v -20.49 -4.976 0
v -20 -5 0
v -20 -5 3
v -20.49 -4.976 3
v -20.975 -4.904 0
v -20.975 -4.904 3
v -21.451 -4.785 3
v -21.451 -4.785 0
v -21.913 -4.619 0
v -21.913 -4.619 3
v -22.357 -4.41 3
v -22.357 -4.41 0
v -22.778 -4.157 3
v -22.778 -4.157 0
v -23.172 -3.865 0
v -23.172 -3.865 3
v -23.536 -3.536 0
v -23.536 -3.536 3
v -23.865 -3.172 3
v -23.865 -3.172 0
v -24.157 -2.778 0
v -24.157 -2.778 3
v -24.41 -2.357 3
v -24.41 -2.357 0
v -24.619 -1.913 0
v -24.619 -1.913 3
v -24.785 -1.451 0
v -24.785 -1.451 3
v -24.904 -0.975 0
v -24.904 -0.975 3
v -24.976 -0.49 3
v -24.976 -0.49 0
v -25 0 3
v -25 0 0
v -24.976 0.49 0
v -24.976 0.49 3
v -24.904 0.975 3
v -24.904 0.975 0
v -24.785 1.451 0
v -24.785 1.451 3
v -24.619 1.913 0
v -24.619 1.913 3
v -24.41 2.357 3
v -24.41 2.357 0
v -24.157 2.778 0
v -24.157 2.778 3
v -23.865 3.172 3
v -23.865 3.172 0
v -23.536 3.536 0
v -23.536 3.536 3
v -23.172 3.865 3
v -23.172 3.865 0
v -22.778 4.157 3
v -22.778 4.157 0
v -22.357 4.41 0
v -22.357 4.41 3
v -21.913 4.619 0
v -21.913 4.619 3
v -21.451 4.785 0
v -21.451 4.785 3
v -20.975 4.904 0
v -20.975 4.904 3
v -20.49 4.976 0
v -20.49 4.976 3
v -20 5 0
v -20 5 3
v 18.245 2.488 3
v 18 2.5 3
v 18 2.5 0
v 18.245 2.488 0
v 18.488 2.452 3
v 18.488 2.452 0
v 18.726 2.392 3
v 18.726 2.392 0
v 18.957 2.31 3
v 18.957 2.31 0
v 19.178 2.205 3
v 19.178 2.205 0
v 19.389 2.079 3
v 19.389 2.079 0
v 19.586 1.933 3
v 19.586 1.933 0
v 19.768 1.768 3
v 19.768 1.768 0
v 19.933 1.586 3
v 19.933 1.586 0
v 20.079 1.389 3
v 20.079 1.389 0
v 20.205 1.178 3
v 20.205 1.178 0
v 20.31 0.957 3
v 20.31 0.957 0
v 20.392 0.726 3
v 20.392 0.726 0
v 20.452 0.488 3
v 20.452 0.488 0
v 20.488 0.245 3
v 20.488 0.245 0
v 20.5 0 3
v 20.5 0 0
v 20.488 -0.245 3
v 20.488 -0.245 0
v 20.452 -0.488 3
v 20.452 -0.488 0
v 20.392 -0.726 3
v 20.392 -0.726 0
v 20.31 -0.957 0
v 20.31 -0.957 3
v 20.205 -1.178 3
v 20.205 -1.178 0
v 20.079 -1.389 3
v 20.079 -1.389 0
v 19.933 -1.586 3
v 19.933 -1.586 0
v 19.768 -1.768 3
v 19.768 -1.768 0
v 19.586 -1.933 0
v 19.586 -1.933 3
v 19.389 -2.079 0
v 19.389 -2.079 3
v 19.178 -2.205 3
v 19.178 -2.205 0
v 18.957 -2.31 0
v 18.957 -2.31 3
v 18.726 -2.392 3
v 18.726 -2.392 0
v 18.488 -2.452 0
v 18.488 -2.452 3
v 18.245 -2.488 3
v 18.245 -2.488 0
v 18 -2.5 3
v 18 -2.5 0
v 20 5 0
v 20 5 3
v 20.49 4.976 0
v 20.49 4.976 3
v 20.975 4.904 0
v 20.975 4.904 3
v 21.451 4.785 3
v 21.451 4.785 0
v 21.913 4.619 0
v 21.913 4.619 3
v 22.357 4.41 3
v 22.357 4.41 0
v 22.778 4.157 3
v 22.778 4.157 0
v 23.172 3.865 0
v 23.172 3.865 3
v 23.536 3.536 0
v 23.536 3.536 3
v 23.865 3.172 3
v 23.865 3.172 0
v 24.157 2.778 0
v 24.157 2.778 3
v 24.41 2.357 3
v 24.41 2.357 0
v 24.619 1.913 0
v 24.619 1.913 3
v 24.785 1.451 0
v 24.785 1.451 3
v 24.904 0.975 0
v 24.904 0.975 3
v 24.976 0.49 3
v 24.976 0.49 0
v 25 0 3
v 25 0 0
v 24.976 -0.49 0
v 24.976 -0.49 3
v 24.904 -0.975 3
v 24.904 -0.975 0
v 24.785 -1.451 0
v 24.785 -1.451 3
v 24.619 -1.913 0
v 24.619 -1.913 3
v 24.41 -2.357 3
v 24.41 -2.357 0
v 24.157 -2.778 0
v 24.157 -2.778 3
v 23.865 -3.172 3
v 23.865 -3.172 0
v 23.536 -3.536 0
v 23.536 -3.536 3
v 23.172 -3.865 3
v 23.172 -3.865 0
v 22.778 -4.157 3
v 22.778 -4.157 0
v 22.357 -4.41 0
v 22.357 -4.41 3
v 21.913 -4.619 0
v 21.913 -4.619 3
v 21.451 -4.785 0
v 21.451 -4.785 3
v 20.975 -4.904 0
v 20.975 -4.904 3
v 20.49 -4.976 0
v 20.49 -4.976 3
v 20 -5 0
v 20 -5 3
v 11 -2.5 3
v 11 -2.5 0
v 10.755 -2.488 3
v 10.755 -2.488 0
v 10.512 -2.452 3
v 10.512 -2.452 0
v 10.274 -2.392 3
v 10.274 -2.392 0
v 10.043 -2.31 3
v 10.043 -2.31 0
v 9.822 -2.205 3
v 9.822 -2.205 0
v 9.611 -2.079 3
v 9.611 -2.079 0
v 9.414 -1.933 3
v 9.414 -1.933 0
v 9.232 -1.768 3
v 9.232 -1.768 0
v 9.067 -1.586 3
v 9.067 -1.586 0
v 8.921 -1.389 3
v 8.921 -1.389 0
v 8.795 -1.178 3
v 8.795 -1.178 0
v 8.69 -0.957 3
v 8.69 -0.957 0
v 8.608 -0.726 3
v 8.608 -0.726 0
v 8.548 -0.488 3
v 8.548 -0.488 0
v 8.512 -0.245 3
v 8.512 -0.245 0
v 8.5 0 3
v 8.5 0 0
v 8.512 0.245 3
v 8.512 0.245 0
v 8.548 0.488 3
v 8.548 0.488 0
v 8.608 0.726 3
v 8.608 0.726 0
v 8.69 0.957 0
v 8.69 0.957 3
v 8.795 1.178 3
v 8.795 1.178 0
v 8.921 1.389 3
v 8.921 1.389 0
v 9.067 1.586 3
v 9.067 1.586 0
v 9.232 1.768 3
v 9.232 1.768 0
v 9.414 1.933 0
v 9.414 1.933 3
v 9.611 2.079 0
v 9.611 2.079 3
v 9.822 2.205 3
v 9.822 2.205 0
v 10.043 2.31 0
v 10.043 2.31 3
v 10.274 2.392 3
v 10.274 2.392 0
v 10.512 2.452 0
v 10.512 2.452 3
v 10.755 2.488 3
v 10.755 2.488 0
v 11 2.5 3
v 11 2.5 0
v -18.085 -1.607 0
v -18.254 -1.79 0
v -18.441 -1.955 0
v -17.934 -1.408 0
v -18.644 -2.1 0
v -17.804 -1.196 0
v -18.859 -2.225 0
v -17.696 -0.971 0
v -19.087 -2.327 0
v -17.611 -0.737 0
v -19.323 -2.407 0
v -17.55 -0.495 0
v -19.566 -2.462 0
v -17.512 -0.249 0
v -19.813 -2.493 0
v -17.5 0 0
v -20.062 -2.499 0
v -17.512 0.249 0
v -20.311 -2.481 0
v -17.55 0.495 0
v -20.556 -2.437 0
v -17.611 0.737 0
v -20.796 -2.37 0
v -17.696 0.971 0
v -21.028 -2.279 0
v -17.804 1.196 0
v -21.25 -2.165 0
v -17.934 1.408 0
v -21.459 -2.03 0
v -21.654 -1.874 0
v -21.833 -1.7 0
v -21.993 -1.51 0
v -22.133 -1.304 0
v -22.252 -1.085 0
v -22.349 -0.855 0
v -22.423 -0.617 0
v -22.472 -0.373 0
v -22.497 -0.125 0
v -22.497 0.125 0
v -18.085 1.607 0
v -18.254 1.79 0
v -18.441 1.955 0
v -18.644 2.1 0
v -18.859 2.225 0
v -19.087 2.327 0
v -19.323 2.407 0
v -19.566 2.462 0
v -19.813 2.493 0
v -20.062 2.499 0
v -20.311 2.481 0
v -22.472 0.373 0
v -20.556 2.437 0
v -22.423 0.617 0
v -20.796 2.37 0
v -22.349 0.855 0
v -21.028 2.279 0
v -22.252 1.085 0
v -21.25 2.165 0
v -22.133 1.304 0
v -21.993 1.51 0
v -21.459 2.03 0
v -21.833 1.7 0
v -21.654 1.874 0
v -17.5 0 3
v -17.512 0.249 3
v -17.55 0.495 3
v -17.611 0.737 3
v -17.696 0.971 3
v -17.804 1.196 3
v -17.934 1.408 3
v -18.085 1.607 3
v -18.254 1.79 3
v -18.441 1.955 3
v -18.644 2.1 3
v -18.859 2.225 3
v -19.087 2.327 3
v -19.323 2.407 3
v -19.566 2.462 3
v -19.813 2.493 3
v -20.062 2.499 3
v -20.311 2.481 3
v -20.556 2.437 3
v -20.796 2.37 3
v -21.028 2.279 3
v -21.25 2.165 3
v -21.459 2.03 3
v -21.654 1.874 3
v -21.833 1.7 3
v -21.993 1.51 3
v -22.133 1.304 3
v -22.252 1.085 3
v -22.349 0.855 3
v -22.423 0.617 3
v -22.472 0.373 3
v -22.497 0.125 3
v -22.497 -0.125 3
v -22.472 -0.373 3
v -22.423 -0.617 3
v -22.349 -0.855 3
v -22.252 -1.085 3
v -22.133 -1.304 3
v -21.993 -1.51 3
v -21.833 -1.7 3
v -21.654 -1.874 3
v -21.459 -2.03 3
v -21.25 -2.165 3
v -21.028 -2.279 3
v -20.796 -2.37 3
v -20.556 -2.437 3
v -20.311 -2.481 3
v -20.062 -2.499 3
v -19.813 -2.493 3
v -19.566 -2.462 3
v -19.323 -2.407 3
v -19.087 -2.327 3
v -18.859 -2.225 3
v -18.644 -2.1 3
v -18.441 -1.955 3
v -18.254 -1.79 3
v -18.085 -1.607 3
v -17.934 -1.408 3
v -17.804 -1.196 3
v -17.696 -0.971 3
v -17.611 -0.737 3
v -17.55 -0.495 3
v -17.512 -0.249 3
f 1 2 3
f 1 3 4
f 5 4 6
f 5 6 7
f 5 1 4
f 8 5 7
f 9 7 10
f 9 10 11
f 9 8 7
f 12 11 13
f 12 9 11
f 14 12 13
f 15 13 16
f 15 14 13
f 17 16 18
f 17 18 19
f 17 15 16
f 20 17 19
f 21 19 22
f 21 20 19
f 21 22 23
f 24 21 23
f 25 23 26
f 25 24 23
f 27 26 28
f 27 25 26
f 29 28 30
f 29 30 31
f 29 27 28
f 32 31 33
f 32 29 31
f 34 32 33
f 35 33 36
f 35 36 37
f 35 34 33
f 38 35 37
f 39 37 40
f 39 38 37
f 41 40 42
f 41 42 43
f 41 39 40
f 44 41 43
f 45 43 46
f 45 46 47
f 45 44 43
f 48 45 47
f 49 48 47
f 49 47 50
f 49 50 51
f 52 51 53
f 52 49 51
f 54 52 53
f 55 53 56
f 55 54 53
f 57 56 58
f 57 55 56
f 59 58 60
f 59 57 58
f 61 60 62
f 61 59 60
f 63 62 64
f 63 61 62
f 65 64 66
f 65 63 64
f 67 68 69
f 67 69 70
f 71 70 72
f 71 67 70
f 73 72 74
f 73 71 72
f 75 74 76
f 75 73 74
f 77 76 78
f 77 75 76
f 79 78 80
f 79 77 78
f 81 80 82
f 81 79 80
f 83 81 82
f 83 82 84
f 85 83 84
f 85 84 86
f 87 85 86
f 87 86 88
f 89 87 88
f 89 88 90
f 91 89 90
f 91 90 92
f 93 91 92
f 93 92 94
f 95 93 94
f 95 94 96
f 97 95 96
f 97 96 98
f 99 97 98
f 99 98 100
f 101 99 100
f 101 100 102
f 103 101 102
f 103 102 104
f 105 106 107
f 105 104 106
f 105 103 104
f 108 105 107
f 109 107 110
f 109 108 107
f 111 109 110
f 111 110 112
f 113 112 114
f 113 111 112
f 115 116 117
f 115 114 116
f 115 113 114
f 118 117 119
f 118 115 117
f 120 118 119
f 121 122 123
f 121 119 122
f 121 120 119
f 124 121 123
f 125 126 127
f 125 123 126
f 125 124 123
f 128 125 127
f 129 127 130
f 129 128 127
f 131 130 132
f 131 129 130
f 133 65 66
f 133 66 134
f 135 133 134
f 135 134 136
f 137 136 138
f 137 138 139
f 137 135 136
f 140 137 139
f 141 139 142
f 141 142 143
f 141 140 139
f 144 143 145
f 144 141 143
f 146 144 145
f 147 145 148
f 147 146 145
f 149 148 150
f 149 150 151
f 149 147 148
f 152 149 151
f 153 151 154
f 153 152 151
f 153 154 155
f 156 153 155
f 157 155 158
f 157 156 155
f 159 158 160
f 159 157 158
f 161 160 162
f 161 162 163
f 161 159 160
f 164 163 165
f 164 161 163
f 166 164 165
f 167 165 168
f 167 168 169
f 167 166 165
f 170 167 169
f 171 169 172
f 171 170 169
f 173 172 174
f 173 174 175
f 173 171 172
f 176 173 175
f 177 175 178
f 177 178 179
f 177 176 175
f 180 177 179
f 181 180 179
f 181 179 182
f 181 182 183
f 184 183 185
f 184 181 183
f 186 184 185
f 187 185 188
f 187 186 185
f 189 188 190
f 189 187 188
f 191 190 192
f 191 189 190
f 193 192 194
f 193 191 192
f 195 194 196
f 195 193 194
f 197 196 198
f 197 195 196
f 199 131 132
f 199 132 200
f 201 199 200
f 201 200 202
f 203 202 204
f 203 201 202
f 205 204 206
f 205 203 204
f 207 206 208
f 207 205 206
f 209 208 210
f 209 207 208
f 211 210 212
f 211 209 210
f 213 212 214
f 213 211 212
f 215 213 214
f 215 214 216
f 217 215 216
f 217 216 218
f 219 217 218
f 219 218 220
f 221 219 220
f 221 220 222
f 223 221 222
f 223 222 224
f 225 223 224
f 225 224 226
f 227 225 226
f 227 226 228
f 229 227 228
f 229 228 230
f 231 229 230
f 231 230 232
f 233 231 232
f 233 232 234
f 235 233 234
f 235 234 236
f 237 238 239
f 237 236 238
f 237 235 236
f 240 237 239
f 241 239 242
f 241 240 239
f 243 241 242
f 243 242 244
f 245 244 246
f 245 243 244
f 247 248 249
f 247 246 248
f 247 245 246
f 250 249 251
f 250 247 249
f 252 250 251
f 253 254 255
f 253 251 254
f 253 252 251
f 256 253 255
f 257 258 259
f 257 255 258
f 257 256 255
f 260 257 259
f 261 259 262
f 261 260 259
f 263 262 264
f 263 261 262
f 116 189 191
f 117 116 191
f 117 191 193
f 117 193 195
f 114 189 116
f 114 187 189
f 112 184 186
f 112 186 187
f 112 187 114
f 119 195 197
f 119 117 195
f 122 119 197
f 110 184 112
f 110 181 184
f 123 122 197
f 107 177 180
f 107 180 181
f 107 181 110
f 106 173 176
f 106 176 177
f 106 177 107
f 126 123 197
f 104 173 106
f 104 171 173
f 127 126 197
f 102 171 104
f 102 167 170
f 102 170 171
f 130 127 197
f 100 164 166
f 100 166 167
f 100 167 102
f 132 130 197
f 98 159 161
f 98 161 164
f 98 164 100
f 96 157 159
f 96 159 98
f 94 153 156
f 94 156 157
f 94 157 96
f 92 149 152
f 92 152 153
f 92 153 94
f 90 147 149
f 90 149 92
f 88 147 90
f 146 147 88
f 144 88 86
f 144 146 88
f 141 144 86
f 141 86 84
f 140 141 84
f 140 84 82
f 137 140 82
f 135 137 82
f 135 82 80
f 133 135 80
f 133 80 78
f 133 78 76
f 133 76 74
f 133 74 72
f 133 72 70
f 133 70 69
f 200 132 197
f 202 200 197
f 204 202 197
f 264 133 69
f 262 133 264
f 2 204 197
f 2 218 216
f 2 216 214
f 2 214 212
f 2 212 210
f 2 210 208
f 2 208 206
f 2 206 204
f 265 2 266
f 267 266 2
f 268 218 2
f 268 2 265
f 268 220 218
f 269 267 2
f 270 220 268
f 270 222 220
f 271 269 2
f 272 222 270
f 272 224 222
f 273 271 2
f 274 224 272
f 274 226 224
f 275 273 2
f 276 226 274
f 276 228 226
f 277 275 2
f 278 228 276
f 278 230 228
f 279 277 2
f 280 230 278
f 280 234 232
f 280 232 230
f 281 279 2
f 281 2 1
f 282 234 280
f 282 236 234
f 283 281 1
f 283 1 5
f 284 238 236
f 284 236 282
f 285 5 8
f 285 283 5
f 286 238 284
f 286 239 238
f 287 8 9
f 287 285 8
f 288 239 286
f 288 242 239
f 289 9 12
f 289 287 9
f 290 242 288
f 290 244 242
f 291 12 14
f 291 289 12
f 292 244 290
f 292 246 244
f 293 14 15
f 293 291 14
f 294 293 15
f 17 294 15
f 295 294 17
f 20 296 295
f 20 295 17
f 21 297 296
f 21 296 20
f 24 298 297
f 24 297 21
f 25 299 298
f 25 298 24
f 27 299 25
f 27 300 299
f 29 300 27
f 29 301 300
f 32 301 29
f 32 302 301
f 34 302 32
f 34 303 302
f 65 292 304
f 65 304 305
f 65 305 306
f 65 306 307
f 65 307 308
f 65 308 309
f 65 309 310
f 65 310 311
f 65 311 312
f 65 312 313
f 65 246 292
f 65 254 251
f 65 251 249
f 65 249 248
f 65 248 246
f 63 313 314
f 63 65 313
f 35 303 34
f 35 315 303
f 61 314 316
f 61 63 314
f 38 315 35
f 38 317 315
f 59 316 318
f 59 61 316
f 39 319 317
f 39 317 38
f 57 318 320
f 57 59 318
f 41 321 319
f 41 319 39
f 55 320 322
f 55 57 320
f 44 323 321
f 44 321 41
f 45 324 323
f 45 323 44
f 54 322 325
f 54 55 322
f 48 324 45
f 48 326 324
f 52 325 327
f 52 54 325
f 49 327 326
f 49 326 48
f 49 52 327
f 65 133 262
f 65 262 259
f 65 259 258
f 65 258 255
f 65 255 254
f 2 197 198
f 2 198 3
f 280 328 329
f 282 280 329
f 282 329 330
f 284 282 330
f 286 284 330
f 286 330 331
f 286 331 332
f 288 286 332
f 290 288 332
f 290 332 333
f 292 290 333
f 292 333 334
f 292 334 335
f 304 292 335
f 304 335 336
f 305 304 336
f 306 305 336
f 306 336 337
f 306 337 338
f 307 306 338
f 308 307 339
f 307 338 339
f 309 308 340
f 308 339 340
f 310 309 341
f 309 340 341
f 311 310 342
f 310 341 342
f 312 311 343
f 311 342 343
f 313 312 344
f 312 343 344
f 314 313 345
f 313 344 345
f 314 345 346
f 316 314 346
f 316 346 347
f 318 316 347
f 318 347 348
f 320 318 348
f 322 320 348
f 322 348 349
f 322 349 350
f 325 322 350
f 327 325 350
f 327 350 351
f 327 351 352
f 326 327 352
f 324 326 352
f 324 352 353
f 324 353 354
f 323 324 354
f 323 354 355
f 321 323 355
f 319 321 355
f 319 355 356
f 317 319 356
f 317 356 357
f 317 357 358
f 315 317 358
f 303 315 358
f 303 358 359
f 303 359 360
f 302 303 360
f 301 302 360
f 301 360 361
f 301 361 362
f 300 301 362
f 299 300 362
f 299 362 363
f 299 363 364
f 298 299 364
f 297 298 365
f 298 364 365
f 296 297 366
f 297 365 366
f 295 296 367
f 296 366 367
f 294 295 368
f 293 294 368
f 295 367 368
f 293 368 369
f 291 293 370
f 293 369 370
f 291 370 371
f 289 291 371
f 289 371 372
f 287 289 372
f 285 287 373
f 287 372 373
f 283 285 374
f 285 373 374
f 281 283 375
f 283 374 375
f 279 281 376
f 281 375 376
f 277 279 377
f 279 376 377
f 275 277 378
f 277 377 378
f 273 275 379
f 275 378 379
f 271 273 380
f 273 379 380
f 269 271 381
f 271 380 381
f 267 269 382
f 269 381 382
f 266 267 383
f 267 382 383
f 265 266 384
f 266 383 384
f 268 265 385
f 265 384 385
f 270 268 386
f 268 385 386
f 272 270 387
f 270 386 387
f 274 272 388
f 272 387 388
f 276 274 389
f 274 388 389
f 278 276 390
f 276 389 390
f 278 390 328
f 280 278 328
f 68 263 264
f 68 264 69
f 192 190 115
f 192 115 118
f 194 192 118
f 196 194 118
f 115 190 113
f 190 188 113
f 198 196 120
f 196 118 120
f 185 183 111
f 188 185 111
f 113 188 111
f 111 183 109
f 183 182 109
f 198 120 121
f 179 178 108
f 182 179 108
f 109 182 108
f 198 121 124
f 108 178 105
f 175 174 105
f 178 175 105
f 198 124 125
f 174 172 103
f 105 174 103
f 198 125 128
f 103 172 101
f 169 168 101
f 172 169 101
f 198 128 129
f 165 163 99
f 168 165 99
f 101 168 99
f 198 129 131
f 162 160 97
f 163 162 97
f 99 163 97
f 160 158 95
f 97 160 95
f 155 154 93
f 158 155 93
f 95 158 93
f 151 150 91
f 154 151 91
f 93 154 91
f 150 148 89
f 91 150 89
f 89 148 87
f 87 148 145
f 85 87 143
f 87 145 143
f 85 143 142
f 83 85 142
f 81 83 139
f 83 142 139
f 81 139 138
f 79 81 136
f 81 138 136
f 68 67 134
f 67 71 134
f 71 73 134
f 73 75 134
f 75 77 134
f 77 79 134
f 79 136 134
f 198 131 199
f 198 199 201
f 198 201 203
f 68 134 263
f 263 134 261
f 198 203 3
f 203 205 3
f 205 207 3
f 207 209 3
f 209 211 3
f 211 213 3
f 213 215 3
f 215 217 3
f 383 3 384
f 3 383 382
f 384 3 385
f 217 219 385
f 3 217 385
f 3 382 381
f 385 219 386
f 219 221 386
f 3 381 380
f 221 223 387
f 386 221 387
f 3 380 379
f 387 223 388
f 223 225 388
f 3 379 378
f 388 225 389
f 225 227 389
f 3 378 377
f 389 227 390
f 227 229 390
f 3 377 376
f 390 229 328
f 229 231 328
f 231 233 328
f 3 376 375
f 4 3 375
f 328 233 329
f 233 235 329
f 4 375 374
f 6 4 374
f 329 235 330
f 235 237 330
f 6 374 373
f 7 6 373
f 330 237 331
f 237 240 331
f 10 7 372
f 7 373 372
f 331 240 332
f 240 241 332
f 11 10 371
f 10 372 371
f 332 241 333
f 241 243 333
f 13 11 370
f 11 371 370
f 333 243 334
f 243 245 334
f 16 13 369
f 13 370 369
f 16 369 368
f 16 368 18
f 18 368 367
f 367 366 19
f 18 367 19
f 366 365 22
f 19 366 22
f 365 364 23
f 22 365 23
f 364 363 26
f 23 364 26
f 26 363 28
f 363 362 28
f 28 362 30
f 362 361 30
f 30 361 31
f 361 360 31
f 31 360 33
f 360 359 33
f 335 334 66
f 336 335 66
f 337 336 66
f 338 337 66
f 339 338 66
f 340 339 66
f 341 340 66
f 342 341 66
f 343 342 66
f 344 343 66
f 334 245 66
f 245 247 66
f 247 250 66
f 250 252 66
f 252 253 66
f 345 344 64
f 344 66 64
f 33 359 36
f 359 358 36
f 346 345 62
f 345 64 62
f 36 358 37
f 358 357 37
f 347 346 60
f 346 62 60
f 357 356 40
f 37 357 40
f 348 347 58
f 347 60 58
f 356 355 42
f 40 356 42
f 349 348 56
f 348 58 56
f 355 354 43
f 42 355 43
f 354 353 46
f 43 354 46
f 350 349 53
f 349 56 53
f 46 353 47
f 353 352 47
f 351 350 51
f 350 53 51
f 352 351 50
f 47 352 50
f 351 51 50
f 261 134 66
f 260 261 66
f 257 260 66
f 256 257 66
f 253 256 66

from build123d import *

# Parameters (mm, degrees)
BOSS_EXTRUDE1_DEPTH = 3
CUT_EXTRUDE1_REACH  = 27.671
SKETCH4_R           = 2.5


with BuildPart() as part:
    # Sketch2 → Boss-Extrude1 (new body)
    with BuildSketch(Plane.XY):
        with BuildLine():
            Line((-20, 5), (20, 5))
            ThreePointArc((20, 5), (25, 0), (20, -5))
            Line((20, -5), (-20, -5))
            ThreePointArc((-20, -5), (-25, 0), (-20, 5))
        make_face()
    extrude(amount=BOSS_EXTRUDE1_DEPTH)

    # Sketch4 → Cut-Extrude1 (cut, up to next)
    with BuildSketch(Plane.XY.offset(3), mode=Mode.PRIVATE) as cut_extrude1_sk1:
        with Locations((-20, 0)):
            Circle(SKETCH4_R)
    cut_extrude1_tool1 = extrude(cut_extrude1_sk1.sketch, amount=-CUT_EXTRUDE1_REACH, mode=Mode.PRIVATE) & part.part
    # Sketch4 → Cut-Extrude1 (cut, up to next)
    with BuildSketch(Plane.XY.offset(3), mode=Mode.PRIVATE) as cut_extrude1_sk2:
        with BuildLine():
            Line((11, 2.5), (18, 2.5))
            ThreePointArc((18, 2.5), (20.5, 0), (18, -2.5))
            Line((18, -2.5), (11, -2.5))
            ThreePointArc((11, -2.5), (8.5, 0), (11, 2.5))
        make_face()
    cut_extrude1_tool2 = extrude(cut_extrude1_sk2.sketch, amount=-CUT_EXTRUDE1_REACH, mode=Mode.PRIVATE) & part.part
    add(cut_extrude1_tool1.solids().sort_by_distance((-20, 0, 3))[0], mode=Mode.SUBTRACT)
    add(cut_extrude1_tool2.solids().sort_by_distance((14.5, 0, 3))[0], mode=Mode.SUBTRACT)


solid = part.part
